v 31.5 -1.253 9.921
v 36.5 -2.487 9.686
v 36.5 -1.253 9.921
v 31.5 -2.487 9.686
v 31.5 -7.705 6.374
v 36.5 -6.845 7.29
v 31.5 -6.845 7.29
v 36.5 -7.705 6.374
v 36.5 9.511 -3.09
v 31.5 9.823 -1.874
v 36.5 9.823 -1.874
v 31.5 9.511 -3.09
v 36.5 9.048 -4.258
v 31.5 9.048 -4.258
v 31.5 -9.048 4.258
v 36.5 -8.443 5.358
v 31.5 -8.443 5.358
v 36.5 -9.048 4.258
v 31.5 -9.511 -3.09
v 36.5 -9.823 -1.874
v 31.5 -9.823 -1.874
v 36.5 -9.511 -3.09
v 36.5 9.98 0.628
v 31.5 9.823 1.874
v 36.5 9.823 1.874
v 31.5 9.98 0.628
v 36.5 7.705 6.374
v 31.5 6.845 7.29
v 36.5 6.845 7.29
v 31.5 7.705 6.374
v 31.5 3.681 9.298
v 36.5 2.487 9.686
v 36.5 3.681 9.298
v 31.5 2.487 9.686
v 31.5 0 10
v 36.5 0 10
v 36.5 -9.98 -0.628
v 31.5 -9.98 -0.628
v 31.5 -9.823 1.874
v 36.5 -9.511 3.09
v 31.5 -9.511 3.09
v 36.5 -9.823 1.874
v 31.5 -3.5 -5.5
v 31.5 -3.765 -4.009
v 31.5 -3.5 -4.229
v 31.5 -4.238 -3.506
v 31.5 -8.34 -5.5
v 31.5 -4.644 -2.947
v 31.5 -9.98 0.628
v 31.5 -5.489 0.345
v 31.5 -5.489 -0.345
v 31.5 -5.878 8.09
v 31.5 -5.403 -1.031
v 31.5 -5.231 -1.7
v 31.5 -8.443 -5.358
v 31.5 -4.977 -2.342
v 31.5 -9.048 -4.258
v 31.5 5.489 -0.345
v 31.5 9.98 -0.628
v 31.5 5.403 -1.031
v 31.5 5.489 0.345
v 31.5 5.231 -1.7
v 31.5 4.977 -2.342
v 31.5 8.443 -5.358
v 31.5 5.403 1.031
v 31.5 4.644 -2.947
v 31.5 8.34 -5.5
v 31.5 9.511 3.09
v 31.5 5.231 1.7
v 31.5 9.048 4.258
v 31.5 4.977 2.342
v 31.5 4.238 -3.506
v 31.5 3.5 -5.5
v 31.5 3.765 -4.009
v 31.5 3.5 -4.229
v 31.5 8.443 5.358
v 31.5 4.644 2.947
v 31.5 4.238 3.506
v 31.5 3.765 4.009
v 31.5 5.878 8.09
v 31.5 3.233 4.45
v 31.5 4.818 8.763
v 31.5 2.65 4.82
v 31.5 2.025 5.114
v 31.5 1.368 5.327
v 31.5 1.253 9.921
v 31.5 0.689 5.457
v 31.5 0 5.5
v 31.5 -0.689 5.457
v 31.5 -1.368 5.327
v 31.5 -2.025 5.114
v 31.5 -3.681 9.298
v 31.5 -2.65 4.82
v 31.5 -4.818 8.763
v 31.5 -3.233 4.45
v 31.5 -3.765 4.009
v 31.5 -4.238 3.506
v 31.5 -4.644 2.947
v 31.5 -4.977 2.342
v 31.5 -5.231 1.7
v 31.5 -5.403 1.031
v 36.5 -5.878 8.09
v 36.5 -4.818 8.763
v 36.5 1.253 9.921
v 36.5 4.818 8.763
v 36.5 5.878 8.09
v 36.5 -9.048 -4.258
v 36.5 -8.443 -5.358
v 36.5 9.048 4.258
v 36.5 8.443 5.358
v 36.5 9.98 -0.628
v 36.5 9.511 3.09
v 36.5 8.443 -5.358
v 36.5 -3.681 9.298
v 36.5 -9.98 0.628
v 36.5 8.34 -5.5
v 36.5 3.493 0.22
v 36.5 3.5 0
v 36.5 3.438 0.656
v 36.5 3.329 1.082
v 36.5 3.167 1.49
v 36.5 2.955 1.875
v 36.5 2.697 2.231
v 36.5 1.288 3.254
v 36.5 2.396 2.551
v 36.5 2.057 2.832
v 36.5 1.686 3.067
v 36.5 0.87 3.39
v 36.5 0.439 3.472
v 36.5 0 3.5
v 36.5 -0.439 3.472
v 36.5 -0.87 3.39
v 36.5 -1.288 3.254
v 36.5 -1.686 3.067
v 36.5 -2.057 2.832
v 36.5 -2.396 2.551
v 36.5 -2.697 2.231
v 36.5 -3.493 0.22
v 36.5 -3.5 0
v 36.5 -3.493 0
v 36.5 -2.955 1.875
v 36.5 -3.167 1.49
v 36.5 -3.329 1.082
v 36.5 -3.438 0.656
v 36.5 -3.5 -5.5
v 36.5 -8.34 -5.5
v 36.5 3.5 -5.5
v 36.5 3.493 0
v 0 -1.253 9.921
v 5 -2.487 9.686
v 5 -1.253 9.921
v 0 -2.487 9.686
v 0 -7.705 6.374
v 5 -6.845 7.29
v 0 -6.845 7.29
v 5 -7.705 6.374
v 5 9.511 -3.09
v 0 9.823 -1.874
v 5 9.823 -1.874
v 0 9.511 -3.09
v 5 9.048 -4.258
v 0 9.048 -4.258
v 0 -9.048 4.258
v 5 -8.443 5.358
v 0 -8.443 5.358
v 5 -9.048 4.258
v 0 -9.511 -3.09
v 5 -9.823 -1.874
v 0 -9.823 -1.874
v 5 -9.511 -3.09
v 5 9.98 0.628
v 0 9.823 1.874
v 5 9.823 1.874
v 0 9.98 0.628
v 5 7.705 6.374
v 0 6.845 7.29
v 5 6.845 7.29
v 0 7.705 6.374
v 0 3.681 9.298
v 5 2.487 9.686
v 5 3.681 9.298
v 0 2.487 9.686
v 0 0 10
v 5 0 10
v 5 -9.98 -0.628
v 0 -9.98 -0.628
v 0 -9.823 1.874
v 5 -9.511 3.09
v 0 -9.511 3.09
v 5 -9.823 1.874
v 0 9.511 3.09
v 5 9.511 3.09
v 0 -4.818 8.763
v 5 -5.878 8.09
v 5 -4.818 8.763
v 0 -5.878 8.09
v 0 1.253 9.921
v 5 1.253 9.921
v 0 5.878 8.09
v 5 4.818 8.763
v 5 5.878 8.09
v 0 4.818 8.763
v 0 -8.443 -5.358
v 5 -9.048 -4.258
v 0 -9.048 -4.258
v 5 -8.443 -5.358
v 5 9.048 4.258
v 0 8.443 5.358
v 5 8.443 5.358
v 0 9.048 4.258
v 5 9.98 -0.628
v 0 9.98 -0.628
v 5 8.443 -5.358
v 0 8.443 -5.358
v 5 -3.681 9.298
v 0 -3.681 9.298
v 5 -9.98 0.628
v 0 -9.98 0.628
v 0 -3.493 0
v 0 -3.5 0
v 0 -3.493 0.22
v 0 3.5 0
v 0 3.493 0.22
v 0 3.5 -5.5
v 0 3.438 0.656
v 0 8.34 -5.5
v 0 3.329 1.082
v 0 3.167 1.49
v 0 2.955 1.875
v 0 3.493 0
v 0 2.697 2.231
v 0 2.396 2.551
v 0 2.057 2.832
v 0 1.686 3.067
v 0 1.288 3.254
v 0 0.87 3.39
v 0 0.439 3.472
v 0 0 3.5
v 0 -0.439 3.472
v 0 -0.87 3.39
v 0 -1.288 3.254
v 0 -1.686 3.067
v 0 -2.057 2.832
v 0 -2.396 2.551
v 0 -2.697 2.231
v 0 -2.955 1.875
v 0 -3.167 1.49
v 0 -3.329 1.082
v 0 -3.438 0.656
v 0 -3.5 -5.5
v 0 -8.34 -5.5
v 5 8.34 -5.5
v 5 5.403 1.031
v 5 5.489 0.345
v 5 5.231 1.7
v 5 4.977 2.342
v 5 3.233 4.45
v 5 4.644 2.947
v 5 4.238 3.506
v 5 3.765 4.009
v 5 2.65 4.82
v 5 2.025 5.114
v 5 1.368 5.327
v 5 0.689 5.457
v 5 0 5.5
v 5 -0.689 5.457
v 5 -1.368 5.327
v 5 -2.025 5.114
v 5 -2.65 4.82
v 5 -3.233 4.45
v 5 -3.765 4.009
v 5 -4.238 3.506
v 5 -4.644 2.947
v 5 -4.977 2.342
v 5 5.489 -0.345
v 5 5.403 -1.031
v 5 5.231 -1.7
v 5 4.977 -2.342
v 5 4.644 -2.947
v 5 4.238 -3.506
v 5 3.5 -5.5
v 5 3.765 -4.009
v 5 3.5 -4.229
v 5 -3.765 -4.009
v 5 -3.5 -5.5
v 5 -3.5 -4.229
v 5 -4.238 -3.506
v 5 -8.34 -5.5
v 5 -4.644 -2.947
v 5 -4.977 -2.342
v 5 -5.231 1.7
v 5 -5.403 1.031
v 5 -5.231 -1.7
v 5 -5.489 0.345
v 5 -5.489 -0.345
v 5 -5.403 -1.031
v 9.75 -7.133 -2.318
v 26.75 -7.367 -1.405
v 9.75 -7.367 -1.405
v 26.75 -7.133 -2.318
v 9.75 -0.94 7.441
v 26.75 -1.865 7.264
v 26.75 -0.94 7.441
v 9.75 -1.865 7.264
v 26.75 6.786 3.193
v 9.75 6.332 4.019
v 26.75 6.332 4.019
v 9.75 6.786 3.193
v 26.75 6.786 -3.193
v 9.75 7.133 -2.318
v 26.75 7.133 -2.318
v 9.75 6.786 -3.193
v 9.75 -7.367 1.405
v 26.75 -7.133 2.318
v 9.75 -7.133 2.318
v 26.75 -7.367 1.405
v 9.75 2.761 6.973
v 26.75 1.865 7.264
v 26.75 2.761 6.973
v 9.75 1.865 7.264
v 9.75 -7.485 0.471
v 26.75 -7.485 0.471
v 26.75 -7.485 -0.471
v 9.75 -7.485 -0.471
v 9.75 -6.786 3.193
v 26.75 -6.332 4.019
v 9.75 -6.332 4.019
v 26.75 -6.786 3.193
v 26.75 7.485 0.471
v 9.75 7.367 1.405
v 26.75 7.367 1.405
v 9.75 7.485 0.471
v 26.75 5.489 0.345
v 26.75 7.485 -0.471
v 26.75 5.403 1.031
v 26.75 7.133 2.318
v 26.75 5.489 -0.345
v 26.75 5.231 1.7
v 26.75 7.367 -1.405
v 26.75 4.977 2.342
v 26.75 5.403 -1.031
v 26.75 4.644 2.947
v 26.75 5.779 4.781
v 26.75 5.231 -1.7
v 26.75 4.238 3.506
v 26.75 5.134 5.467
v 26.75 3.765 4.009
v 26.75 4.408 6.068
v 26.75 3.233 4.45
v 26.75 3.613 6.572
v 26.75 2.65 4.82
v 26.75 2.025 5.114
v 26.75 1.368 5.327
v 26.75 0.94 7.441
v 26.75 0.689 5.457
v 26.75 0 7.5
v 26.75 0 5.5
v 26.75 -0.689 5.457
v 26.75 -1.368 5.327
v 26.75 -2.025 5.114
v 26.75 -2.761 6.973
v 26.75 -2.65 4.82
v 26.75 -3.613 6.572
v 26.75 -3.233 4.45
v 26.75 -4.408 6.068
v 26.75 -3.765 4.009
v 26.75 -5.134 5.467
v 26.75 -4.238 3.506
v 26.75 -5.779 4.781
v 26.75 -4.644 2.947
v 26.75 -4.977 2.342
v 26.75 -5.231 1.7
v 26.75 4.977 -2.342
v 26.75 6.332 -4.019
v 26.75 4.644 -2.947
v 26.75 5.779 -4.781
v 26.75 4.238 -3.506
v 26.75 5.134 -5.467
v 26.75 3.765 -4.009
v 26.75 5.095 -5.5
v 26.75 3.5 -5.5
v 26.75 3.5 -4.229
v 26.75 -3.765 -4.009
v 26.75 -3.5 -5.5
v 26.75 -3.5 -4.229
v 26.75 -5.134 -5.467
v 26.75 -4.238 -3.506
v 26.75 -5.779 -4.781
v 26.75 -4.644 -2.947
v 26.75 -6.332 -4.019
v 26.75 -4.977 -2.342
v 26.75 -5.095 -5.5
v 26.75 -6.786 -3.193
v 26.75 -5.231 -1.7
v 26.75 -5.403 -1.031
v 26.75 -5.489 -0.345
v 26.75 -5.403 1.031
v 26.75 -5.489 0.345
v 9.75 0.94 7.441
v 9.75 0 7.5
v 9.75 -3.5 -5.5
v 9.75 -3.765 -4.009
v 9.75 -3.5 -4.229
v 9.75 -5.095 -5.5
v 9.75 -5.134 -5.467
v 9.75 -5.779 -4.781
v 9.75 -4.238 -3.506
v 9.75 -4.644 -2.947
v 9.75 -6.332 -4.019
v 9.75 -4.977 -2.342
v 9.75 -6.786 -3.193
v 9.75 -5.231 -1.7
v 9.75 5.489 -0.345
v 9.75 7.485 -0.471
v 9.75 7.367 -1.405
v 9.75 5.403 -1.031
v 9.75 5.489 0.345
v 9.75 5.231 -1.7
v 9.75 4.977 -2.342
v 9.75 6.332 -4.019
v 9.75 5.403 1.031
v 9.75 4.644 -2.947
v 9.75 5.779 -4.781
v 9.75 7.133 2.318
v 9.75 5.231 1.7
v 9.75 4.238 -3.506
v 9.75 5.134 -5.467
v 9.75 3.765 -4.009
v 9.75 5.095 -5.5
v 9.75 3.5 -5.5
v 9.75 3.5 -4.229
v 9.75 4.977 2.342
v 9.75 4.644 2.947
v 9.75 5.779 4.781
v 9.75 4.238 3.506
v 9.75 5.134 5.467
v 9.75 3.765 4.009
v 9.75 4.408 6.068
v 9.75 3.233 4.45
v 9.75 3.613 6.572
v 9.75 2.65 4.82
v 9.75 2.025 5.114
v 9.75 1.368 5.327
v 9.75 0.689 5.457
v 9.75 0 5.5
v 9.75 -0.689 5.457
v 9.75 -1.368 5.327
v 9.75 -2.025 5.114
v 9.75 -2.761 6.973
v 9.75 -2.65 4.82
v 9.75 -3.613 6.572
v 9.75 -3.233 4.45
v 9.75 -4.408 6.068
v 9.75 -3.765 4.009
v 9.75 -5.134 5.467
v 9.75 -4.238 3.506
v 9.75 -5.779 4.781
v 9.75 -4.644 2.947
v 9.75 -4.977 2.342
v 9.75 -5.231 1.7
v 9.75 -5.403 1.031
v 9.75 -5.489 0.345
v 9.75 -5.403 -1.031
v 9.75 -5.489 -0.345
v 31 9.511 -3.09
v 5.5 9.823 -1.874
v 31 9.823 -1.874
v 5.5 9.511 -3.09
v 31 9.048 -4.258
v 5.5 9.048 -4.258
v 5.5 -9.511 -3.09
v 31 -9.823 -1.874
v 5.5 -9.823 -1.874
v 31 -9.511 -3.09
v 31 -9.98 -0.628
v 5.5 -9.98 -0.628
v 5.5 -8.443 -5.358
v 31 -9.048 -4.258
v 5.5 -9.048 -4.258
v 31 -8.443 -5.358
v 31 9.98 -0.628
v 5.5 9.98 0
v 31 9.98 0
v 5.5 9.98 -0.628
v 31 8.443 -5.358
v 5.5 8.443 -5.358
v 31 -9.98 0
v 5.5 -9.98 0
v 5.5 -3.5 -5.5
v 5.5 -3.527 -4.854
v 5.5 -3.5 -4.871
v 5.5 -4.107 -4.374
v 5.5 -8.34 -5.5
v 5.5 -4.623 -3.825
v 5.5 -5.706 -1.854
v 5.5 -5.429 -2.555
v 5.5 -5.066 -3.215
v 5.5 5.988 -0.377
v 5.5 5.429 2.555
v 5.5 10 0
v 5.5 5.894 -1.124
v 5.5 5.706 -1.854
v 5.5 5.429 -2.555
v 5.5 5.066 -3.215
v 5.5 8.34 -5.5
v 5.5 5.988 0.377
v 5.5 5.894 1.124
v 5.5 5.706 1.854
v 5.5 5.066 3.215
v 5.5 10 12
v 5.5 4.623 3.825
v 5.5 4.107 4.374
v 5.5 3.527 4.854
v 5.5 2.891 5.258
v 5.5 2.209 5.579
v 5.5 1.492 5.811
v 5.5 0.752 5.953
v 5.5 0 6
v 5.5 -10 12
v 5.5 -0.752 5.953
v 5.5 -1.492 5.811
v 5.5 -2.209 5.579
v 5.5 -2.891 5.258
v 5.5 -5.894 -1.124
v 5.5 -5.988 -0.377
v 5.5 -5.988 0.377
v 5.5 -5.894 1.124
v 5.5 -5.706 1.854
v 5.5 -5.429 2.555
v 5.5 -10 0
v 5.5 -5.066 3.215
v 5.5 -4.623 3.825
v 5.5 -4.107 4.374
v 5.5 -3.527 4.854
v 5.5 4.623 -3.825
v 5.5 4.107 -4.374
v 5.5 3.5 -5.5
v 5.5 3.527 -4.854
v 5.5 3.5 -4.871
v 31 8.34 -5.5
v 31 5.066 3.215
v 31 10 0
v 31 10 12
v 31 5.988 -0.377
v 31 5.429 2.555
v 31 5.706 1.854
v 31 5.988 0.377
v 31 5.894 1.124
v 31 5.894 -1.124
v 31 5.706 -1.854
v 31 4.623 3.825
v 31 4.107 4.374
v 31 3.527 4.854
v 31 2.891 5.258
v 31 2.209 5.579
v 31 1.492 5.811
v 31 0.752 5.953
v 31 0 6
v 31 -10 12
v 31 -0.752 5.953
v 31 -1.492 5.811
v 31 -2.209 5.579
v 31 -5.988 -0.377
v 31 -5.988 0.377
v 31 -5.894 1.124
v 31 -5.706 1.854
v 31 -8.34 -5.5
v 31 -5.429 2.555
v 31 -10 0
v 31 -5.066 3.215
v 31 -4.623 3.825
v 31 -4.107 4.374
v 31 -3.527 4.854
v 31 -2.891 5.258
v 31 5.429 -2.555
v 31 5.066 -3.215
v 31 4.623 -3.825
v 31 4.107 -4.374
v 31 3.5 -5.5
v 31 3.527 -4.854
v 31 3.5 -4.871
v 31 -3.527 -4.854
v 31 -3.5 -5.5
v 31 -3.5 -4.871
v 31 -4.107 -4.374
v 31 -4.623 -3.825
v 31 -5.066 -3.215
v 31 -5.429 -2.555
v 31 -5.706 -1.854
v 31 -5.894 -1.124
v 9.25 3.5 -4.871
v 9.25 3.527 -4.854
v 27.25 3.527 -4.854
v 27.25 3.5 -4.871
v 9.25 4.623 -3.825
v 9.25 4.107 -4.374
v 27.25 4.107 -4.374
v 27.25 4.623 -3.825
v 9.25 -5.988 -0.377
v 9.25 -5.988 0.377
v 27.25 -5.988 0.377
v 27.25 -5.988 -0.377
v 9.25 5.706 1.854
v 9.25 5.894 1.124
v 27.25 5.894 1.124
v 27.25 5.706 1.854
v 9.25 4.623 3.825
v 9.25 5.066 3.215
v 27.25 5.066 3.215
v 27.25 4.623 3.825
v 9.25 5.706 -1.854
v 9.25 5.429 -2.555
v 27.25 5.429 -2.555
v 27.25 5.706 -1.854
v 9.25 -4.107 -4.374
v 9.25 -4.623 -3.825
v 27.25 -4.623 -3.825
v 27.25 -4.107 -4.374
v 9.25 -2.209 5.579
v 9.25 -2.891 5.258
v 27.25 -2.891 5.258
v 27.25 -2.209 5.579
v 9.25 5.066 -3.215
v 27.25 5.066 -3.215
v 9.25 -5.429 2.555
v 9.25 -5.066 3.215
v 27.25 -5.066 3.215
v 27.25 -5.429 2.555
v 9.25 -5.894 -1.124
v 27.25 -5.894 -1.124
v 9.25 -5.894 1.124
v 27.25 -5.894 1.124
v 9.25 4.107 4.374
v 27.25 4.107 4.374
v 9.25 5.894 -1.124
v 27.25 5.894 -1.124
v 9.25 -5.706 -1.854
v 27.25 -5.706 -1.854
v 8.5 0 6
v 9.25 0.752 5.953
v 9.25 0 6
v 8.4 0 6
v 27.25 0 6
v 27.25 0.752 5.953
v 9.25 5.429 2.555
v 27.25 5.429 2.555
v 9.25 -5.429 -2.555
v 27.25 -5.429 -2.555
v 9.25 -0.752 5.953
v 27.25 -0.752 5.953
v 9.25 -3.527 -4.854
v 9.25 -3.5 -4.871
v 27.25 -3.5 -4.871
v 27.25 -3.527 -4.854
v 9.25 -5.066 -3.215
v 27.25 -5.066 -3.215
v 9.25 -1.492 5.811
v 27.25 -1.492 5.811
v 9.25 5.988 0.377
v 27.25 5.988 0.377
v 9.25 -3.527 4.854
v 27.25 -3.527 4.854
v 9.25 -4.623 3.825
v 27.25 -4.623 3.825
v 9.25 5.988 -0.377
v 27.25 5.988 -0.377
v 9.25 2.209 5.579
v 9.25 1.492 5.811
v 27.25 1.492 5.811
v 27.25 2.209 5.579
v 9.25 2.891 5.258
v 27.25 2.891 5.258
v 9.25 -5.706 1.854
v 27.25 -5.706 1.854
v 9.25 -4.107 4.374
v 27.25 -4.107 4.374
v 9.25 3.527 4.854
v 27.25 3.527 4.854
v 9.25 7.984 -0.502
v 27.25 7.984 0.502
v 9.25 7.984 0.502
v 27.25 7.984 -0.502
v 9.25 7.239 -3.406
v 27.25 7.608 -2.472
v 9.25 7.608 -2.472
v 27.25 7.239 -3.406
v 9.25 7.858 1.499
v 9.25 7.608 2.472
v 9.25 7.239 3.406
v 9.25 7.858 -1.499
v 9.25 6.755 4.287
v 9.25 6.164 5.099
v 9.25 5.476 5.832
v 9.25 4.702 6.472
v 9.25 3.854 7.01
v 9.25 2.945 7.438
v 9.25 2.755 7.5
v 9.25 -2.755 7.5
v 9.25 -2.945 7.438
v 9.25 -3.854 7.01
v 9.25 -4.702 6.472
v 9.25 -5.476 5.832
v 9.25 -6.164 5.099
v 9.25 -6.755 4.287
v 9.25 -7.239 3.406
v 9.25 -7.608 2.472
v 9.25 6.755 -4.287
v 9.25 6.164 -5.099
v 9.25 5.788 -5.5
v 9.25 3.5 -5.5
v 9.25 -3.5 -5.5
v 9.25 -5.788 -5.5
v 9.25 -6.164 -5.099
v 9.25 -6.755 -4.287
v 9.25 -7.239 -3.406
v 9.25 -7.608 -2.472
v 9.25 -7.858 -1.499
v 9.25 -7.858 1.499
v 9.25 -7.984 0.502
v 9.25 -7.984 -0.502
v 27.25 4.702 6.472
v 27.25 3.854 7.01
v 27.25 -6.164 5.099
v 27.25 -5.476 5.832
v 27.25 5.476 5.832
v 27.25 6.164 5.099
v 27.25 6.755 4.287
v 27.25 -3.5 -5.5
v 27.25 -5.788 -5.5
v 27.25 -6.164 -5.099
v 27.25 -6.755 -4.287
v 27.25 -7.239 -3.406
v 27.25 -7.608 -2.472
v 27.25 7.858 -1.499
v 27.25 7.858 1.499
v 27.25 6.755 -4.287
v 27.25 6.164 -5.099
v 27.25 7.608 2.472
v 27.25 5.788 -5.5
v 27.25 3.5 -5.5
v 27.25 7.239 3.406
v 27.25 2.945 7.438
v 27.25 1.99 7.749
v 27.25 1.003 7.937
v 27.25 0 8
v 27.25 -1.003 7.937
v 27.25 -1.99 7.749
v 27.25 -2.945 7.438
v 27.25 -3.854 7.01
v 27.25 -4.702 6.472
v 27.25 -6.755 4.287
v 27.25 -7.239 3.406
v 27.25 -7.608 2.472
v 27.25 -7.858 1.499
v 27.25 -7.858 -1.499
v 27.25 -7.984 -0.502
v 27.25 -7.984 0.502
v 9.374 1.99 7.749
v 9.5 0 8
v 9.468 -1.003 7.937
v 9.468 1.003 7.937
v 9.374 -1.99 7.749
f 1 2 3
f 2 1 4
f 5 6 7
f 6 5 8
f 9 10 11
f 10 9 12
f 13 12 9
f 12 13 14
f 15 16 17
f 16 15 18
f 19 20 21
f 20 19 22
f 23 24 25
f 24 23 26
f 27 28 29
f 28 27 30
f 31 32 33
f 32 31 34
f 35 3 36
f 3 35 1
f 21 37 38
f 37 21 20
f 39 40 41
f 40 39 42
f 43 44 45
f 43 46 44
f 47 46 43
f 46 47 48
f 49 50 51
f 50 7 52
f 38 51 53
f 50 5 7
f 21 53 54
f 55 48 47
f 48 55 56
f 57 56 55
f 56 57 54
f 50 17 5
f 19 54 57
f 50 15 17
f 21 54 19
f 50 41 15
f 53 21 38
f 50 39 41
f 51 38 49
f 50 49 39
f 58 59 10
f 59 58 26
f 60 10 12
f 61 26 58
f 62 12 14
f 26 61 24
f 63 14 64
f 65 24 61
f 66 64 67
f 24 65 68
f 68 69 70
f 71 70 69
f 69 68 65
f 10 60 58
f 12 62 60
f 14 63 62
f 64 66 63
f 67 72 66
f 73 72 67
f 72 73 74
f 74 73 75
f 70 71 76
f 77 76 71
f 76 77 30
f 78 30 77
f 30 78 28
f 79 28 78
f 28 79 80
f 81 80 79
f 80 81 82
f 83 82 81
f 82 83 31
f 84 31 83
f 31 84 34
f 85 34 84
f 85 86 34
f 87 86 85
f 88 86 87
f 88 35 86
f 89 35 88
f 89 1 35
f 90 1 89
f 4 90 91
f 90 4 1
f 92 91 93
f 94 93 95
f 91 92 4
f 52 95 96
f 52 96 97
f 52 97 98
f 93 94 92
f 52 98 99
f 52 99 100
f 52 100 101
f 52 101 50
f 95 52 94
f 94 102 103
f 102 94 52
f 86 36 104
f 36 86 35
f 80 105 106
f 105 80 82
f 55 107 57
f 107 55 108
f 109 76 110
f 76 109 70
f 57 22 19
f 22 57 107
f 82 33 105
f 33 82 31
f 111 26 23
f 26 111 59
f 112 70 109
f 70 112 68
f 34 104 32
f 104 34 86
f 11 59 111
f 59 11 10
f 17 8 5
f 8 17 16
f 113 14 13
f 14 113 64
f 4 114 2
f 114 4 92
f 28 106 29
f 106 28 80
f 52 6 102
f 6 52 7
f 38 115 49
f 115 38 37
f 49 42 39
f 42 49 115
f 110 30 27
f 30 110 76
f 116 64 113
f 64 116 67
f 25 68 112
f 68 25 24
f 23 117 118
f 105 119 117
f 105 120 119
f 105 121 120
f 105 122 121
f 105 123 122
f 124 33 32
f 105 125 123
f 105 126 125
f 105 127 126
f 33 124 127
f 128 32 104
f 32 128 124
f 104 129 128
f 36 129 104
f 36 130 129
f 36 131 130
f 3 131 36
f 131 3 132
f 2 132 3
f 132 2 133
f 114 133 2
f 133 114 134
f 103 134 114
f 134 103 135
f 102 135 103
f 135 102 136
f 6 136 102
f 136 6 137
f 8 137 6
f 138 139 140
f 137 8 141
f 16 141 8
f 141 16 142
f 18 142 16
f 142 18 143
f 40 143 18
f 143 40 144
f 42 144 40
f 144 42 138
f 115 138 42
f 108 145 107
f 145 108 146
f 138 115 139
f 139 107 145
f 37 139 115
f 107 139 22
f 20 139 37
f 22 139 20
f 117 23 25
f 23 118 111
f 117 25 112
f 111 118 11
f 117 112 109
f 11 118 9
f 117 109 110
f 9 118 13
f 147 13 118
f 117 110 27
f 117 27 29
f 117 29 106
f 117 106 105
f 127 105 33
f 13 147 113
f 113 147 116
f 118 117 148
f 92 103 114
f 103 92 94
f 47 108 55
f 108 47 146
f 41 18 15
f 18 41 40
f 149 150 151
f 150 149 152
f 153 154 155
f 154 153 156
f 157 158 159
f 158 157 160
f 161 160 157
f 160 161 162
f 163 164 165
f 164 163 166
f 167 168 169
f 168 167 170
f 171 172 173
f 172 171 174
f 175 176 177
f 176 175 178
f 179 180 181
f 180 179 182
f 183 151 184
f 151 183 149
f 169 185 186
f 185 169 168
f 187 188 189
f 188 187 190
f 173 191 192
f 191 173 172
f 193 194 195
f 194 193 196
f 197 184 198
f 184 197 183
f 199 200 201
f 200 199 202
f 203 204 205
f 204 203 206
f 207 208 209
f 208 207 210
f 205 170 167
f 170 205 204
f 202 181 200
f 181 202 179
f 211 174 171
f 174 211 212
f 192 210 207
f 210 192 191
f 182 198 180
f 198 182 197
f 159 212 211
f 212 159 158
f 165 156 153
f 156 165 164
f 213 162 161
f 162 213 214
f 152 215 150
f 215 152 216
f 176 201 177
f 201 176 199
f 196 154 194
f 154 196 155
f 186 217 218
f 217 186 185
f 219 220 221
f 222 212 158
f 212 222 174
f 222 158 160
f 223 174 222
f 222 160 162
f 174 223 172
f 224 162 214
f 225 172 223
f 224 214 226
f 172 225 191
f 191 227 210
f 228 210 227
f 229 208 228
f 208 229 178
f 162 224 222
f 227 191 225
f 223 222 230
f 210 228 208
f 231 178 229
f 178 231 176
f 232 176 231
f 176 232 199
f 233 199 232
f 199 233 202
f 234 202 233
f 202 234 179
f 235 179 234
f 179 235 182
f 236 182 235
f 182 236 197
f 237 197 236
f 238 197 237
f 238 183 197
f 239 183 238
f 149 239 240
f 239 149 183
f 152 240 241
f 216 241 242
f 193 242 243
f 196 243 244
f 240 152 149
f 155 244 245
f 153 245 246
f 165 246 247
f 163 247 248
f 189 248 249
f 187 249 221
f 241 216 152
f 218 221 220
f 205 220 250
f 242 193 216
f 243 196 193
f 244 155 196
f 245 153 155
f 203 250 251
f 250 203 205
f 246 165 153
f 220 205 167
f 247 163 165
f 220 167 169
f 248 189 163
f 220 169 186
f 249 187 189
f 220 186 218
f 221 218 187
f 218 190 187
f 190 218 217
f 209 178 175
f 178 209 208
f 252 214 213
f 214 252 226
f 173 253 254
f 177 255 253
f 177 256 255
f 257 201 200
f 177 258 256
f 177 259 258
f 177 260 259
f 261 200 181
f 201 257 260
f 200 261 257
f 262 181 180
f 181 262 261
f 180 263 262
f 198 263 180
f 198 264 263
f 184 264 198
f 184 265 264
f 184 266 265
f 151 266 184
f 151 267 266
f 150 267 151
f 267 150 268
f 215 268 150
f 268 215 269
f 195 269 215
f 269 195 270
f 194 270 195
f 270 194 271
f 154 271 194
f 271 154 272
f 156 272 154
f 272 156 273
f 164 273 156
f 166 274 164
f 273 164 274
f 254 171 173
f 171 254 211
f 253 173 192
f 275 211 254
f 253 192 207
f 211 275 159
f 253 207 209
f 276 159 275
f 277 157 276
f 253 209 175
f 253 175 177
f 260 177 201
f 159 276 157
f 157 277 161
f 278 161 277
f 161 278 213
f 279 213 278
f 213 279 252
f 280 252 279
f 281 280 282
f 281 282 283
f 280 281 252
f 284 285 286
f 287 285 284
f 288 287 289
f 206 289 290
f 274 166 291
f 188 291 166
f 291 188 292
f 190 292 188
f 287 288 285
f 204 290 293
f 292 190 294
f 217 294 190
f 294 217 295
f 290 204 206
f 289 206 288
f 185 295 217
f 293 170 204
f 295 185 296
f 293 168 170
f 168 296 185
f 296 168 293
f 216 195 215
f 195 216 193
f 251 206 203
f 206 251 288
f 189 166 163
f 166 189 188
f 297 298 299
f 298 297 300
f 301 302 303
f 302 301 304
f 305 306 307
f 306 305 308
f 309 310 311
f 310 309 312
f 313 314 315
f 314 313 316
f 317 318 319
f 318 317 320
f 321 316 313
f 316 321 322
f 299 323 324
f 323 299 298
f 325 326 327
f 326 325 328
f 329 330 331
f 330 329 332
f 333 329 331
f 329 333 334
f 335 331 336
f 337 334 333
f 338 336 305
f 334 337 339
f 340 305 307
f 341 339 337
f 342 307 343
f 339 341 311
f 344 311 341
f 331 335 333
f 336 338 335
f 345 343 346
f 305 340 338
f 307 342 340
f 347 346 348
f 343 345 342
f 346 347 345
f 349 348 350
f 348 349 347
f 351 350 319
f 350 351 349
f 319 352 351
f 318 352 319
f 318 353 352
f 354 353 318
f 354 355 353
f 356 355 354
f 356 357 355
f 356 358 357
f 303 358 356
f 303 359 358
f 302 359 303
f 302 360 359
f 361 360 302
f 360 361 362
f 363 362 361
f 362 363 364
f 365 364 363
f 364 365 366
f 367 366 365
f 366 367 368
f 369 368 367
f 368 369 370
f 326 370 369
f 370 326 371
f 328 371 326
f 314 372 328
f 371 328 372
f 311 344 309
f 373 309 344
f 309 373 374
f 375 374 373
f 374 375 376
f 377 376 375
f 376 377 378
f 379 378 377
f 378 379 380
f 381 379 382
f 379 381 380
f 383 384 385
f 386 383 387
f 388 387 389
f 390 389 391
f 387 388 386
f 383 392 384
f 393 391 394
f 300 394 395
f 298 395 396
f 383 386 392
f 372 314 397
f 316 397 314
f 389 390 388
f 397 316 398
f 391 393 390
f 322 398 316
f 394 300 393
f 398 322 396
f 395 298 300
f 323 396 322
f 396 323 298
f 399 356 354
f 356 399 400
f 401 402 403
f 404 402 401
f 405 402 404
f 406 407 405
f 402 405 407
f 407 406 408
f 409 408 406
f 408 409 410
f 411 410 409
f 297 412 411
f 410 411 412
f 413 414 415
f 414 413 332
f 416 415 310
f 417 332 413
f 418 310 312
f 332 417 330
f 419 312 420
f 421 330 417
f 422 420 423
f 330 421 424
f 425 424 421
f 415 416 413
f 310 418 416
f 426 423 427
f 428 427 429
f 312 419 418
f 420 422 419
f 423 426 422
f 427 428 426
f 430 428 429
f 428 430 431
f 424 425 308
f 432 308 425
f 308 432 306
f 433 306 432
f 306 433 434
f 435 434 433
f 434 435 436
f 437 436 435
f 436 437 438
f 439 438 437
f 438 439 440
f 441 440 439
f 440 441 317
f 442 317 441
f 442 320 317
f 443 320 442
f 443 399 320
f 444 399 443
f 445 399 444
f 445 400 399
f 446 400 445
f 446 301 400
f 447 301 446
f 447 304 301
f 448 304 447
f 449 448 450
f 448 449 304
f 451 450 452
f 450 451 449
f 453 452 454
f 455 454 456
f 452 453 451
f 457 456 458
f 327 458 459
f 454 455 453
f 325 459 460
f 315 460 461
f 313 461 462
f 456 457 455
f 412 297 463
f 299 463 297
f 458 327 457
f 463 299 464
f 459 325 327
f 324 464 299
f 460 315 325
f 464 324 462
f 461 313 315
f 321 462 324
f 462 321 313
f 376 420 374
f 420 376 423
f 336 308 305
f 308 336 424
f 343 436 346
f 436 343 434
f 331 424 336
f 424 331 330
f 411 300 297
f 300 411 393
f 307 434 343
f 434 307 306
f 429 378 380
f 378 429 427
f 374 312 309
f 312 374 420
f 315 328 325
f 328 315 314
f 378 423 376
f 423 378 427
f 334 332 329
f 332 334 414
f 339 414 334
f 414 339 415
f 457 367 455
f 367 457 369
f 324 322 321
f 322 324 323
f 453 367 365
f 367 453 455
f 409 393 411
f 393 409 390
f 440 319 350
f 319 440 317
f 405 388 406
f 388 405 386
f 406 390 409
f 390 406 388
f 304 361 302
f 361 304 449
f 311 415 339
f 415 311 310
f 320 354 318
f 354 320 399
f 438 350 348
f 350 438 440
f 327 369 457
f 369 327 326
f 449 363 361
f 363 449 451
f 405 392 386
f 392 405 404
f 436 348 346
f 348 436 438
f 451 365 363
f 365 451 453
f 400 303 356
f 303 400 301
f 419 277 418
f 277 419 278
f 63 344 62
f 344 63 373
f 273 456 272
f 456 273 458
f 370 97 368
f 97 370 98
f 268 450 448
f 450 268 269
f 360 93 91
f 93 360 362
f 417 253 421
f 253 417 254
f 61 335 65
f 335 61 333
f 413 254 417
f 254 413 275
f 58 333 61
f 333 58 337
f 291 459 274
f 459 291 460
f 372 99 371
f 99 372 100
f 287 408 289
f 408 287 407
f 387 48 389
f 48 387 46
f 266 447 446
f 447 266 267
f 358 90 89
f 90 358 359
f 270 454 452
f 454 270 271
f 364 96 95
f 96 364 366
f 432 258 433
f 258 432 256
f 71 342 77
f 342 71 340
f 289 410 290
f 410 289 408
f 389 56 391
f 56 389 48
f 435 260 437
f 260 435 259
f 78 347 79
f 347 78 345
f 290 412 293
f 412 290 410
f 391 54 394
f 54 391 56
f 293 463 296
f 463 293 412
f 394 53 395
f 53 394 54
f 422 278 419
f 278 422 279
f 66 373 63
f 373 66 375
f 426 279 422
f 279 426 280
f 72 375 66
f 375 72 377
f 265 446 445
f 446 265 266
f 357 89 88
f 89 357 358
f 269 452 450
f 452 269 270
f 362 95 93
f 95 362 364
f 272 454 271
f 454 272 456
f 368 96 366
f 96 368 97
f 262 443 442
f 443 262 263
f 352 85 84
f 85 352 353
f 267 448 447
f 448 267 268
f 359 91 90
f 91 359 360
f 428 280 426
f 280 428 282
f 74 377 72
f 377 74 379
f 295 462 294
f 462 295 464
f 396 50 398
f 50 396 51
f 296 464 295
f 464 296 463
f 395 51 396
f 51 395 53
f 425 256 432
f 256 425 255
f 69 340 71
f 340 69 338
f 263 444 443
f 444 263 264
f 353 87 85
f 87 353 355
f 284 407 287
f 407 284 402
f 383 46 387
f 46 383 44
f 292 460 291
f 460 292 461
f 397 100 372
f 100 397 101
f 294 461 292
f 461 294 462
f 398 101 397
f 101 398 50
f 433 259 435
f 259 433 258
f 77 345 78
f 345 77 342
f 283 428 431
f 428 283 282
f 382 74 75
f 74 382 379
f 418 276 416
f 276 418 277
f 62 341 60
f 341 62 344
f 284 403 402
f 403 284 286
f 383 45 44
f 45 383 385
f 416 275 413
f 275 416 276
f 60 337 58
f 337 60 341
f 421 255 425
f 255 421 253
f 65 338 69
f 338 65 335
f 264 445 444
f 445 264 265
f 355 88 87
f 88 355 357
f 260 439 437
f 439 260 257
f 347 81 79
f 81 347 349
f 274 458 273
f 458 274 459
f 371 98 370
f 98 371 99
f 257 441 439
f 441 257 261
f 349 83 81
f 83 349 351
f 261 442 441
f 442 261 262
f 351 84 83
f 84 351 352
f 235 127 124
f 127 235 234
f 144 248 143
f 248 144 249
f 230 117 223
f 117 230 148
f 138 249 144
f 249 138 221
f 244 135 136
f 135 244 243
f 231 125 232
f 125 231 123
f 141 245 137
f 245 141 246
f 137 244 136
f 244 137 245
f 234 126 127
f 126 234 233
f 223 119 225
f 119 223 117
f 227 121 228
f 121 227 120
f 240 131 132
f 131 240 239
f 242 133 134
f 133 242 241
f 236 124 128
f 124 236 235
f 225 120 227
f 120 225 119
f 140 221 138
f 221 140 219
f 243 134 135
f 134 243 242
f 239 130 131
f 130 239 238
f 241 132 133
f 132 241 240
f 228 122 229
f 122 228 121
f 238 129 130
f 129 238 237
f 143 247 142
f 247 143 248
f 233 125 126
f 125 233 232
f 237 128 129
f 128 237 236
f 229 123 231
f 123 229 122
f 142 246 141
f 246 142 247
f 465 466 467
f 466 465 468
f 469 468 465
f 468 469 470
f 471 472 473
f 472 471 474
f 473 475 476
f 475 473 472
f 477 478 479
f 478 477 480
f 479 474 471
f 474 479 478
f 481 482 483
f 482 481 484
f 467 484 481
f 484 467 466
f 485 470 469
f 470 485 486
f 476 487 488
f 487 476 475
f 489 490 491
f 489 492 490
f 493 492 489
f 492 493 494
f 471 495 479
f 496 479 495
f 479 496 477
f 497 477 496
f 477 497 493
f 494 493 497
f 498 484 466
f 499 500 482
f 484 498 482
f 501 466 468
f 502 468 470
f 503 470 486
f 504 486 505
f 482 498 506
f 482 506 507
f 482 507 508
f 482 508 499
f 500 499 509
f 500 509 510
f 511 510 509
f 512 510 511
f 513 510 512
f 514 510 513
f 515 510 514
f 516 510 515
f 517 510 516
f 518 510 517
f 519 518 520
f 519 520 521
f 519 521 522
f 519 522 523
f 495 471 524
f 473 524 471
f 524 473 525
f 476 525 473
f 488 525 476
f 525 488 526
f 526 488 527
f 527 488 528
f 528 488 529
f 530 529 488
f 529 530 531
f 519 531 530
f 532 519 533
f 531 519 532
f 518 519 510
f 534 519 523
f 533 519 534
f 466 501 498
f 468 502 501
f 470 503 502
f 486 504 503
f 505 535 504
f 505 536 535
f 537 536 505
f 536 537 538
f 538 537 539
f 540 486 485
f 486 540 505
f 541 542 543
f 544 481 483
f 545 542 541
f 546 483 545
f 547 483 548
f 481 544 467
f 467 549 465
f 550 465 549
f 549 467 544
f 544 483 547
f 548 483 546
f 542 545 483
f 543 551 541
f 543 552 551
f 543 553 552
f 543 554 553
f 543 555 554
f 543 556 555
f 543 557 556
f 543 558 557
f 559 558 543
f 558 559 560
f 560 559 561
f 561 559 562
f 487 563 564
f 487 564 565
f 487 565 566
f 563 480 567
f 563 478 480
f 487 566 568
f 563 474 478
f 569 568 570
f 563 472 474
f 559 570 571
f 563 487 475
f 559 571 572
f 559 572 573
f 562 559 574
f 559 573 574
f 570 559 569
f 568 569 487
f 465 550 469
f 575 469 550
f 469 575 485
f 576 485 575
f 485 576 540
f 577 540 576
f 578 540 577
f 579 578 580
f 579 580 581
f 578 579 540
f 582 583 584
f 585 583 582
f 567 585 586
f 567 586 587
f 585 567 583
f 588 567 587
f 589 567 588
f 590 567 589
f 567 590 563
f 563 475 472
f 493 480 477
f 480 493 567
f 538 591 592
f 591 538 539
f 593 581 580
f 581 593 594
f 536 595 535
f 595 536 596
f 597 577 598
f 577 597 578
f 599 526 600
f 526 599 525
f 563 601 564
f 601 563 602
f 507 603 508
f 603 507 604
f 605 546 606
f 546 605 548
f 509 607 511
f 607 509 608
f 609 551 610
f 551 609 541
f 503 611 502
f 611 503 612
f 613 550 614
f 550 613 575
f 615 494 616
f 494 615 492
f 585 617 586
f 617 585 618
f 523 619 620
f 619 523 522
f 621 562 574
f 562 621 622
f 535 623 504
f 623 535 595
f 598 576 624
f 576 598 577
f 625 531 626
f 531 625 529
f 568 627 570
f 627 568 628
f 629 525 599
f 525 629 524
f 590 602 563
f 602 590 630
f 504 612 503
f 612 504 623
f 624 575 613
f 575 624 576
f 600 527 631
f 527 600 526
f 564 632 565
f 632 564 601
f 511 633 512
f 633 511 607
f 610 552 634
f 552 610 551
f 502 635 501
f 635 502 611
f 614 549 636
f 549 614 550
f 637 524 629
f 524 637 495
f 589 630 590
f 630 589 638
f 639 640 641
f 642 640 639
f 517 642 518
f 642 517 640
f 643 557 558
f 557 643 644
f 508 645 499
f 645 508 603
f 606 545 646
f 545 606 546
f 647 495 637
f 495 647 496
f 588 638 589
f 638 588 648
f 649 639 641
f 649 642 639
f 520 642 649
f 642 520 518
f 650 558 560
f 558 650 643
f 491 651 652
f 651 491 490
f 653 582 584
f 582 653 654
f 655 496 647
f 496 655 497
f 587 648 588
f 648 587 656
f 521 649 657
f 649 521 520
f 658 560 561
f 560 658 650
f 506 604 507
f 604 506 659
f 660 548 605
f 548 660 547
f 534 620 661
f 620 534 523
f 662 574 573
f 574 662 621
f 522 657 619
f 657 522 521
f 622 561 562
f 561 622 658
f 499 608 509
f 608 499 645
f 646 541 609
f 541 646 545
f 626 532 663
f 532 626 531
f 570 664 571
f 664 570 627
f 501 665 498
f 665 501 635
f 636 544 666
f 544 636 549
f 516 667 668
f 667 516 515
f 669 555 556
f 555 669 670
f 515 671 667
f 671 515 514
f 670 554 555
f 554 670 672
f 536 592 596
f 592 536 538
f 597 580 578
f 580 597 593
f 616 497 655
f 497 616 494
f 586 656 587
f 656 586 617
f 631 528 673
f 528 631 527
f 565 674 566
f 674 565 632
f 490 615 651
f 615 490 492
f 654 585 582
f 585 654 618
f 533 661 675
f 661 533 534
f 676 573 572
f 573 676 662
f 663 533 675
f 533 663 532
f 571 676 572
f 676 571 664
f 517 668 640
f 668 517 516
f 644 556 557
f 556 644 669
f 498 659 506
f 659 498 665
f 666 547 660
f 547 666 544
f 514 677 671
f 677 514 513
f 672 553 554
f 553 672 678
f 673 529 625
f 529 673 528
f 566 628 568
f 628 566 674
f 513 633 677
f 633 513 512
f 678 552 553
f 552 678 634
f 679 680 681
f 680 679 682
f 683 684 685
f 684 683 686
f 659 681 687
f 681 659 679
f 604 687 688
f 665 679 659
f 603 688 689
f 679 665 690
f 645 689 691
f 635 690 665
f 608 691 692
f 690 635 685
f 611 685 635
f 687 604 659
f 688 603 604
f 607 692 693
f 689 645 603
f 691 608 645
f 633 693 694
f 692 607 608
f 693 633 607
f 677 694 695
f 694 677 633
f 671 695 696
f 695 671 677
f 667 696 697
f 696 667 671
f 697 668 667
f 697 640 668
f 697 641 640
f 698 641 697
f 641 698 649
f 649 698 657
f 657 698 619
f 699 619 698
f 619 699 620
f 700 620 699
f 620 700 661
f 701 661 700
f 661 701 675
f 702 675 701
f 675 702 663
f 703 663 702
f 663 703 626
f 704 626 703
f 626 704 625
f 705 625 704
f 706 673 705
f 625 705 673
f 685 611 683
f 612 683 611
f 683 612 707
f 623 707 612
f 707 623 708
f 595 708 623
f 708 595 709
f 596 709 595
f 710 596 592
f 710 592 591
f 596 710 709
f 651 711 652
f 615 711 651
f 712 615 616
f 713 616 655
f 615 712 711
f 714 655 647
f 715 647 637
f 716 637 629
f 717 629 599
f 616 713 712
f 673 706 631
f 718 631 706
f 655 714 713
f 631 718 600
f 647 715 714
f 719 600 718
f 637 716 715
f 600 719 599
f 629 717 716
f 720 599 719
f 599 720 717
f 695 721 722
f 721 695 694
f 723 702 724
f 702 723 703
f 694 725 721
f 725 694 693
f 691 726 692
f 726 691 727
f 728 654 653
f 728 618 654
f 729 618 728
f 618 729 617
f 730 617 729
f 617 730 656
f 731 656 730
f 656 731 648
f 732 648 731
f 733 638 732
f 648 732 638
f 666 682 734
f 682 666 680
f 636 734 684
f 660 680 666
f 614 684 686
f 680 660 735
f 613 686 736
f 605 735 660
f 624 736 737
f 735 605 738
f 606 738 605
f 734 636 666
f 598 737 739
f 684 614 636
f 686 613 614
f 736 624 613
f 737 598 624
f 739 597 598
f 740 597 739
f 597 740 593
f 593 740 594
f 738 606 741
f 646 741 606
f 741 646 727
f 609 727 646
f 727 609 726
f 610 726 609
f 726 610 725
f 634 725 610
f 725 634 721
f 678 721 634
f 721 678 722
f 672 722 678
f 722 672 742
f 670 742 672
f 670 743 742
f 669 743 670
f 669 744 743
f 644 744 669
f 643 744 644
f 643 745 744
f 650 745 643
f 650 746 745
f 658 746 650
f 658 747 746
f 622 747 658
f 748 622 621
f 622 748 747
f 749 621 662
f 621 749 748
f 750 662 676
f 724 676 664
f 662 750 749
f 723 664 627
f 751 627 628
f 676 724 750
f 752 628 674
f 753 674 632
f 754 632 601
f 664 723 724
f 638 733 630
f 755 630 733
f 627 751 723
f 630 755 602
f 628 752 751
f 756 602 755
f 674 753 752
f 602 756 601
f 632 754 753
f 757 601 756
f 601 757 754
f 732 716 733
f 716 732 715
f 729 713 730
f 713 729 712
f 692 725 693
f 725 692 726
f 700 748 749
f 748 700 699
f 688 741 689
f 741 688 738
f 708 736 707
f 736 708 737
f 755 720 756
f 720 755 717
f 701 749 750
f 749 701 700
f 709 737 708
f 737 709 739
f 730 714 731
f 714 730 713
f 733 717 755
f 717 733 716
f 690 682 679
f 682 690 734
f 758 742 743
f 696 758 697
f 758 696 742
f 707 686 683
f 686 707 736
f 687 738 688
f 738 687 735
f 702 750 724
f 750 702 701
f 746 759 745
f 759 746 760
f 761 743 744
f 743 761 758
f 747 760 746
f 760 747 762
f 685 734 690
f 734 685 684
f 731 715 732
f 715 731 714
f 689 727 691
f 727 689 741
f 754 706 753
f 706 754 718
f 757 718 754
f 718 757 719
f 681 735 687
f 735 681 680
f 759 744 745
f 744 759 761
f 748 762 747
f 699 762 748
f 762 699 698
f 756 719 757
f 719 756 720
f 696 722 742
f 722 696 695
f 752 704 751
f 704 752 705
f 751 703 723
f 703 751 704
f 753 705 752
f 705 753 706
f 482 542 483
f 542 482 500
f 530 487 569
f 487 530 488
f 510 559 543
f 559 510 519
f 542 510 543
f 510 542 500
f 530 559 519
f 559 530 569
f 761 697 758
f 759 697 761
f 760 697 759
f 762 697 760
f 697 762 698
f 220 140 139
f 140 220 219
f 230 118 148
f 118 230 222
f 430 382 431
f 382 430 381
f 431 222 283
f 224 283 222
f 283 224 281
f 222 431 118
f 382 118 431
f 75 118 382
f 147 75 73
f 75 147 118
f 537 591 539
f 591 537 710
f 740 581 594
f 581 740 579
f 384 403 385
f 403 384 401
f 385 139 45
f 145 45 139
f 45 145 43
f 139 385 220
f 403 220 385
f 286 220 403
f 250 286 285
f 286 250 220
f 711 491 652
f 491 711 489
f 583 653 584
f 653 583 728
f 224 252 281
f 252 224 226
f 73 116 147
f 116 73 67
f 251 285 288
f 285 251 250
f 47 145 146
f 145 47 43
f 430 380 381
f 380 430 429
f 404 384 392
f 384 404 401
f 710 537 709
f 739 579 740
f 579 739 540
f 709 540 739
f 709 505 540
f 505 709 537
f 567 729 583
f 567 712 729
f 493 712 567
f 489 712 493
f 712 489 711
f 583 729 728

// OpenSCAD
/* [PrintOptions] */
// preview[view:south east, tilt:bottom diagonal]

// splits the cable holder into 2 parts for printing if your machine doesn't do well with printing tight tolerances
show_seperate = "no"; // [yes, no]

/* [Basic] */
// is the diameter of the cable in mm to be held by the cable holder
cable_diameter = 7;
// sets the distance between the holding tabs in mm
table_thickness = 19.5;
// controls the distance between moving parts of the cable holder
tolerance = 0.5;
// Distance of the knob to the desk
desk_distance = 2;

/* [Table_tabs] */
// adjusts the length of the tabs in mm that will hold the cable holder on to the table
tab_length = 0;
// adjusts how thick the tabs that hold the cable holder to the table should be in mm
tab_thickness = 3;

/* [Table_grip] */
// adjusts the triangular grip protrusion height in mm
grip_height = 1;
// adjusts the base width of the triangular grip protrusion in mm
grip_width = 4;

/* [Thumbwheels] */
//controls how tall the end thumbwheels should be in mm
thumbwheel_height = 5;

/* [Advanced] */
// is confusing name, just play with it and see what it does
retainer_factor = 6; // [3, 4, 5, 6, 7, 8, 9, 10]
// is another one to play around with.  Choose values between 0 and 2
plane_cut_factor = 1;
// is the quality of the cylinders
$fn = 50;

/* [Advanced_neck] */
// is the thickness of the inner rotating cuff in mm
neck_thickness = 2;

/* [Advanced_holder] */
// controls the overall thickness of the outer holder in mm
holder_thickness = 4;

/* [Hidden] */
barrel_lift_factor = 1/retainer_factor;
barrel_thickness = holder_thickness/2;

holder_height = 2*tab_thickness + table_thickness;
holder_diameter = cable_diameter + 2*neck_thickness + 2*tolerance + 2*holder_thickness;
plane_cut_depth = plane_cut_factor*(cable_diameter/2 + neck_thickness);

preview_tab = "";

rotate([0,90,0]) difference()
{

	// main holder barrels and tabs
	union()
	{
		// inner barrel
		
		if(show_seperate == "no")
		{
			InnerBarrel();
		}
		else
		{
			translate([0, holder_diameter + 5, 0]) 
			difference()
			{
				InnerBarrel();
				// cable notch
				translate([0, -cable_diameter/2, -0.5]) cube([holder_diameter/2 + 0.5, cable_diameter, thumbwheel_height + tolerance + holder_height + tolerance + thumbwheel_height + 1]);
				// plane slice
				translate([plane_cut_depth, -(holder_diameter + 1)/2, -0.5]) cube([holder_diameter/2 + 0.5, holder_diameter + 1, thumbwheel_height + tolerance + holder_height + tolerance + thumbwheel_height + 1]);
			}
		}
		
		// outer holder barrel
		highlight("Advanced_holder") difference()
		{
			// main body of the holder
			translate([0,0, thumbwheel_height + tolerance]) cylinder(r = holder_diameter/2, h = holder_height);
			
			// tolerance for neck
			translate([0,0,thumbwheel_height + tolerance + -0.5]) cylinder(r = cable_diameter/2 + neck_thickness + tolerance, h = holder_height + 1);
			// tolerance for the barrel
			translate([0,0, thumbwheel_height + tolerance + barrel_lift_factor*holder_height-tolerance]) cylinder(r = cable_diameter/2 + neck_thickness + barrel_thickness + tolerance, h = holder_height*(1-2*barrel_lift_factor) + 2*tolerance);
		}
		
		// main body holder
		union()
		{
			// upper tab
			highlight("Table_tabs") translate([-tab_length - holder_diameter/2, -holder_diameter/2, thumbwheel_height + tolerance + holder_height - tab_thickness]) cube([tab_length + 0.1, holder_diameter, tab_thickness]);
			// lower tab
			highlight("Table_tabs")translate([-tab_length - holder_diameter/2, -holder_diameter/2, thumbwheel_height + tolerance]) cube([tab_length + 0.1, holder_diameter, tab_thickness]);
			// lower grip
			highlight("Table_grip") translate([-tab_length - holder_diameter/2, holder_diameter/2,  thumbwheel_height + tolerance + tab_thickness]) rotate([90, 0, 0]) linear_extrude(height = holder_diameter, convexity = 10) polygon(points = [[0,0], [grip_width/2,grip_height], [grip_width,0], [grip_width,-0.1], [0,-0.1]]);
			
			// body block to cylinder
			highlight("Advanced_holder") difference()
			{
				// main body block
				translate([-holder_diameter/2-desk_distance, -holder_diameter/2, thumbwheel_height + tolerance]) cube([holder_diameter/2+desk_distance, holder_diameter, holder_height]);
				// cylinder cut
				translate([0,0, thumbwheel_height + tolerance - 0.1]) cylinder(r = holder_diameter/2, h = holder_height + 1);
			}
		}
	}

	// cable notch
	translate([0, -cable_diameter/2, -0.5]) cube([holder_diameter/2 + 0.5, cable_diameter, thumbwheel_height + tolerance + holder_height + tolerance + thumbwheel_height + 1]);
	// plane slice
	translate([plane_cut_depth, -(holder_diameter + 1)/2, -0.5]) cube([holder_diameter/2 + 0.5, holder_diameter + 1, thumbwheel_height + tolerance + holder_height + tolerance + thumbwheel_height + 1]);
}

module InnerBarrel()
{
	difference()
		{
			union()
			{
				// top thumbwheel
				highlight("Thumbwheels") translate([0,0, thumbwheel_height + tolerance + holder_height+tolerance]) cylinder(r = holder_diameter/2, h = thumbwheel_height);
				// bottom thumbwheel
				highlight("Thumbwheels") cylinder(r = holder_diameter/2, h = thumbwheel_height);
				// retaining barrel
				translate([0,0, thumbwheel_height + tolerance + barrel_lift_factor*holder_height]) cylinder(r = cable_diameter/2 + neck_thickness + barrel_thickness, h = holder_height*(1-2*barrel_lift_factor));
				// the main barrel, or the "neck"
				highlight("Advanced_neck") cylinder(r = cable_diameter/2 + neck_thickness, h =thumbwheel_height + tolerance +  holder_height + tolerance + thumbwheel_height);
			}

			// The hole for the cable to go through
			translate([0,0,-.5]) cylinder(r = cable_diameter/2, h = thumbwheel_height + tolerance + holder_height + tolerance + thumbwheel_height + 1);
		}
}

module highlight(this_tab)
{
	if(preview_tab == this_tab)
	{
		color("red") children(0);
	}
	else
	{	
		children(0);
	}
}
